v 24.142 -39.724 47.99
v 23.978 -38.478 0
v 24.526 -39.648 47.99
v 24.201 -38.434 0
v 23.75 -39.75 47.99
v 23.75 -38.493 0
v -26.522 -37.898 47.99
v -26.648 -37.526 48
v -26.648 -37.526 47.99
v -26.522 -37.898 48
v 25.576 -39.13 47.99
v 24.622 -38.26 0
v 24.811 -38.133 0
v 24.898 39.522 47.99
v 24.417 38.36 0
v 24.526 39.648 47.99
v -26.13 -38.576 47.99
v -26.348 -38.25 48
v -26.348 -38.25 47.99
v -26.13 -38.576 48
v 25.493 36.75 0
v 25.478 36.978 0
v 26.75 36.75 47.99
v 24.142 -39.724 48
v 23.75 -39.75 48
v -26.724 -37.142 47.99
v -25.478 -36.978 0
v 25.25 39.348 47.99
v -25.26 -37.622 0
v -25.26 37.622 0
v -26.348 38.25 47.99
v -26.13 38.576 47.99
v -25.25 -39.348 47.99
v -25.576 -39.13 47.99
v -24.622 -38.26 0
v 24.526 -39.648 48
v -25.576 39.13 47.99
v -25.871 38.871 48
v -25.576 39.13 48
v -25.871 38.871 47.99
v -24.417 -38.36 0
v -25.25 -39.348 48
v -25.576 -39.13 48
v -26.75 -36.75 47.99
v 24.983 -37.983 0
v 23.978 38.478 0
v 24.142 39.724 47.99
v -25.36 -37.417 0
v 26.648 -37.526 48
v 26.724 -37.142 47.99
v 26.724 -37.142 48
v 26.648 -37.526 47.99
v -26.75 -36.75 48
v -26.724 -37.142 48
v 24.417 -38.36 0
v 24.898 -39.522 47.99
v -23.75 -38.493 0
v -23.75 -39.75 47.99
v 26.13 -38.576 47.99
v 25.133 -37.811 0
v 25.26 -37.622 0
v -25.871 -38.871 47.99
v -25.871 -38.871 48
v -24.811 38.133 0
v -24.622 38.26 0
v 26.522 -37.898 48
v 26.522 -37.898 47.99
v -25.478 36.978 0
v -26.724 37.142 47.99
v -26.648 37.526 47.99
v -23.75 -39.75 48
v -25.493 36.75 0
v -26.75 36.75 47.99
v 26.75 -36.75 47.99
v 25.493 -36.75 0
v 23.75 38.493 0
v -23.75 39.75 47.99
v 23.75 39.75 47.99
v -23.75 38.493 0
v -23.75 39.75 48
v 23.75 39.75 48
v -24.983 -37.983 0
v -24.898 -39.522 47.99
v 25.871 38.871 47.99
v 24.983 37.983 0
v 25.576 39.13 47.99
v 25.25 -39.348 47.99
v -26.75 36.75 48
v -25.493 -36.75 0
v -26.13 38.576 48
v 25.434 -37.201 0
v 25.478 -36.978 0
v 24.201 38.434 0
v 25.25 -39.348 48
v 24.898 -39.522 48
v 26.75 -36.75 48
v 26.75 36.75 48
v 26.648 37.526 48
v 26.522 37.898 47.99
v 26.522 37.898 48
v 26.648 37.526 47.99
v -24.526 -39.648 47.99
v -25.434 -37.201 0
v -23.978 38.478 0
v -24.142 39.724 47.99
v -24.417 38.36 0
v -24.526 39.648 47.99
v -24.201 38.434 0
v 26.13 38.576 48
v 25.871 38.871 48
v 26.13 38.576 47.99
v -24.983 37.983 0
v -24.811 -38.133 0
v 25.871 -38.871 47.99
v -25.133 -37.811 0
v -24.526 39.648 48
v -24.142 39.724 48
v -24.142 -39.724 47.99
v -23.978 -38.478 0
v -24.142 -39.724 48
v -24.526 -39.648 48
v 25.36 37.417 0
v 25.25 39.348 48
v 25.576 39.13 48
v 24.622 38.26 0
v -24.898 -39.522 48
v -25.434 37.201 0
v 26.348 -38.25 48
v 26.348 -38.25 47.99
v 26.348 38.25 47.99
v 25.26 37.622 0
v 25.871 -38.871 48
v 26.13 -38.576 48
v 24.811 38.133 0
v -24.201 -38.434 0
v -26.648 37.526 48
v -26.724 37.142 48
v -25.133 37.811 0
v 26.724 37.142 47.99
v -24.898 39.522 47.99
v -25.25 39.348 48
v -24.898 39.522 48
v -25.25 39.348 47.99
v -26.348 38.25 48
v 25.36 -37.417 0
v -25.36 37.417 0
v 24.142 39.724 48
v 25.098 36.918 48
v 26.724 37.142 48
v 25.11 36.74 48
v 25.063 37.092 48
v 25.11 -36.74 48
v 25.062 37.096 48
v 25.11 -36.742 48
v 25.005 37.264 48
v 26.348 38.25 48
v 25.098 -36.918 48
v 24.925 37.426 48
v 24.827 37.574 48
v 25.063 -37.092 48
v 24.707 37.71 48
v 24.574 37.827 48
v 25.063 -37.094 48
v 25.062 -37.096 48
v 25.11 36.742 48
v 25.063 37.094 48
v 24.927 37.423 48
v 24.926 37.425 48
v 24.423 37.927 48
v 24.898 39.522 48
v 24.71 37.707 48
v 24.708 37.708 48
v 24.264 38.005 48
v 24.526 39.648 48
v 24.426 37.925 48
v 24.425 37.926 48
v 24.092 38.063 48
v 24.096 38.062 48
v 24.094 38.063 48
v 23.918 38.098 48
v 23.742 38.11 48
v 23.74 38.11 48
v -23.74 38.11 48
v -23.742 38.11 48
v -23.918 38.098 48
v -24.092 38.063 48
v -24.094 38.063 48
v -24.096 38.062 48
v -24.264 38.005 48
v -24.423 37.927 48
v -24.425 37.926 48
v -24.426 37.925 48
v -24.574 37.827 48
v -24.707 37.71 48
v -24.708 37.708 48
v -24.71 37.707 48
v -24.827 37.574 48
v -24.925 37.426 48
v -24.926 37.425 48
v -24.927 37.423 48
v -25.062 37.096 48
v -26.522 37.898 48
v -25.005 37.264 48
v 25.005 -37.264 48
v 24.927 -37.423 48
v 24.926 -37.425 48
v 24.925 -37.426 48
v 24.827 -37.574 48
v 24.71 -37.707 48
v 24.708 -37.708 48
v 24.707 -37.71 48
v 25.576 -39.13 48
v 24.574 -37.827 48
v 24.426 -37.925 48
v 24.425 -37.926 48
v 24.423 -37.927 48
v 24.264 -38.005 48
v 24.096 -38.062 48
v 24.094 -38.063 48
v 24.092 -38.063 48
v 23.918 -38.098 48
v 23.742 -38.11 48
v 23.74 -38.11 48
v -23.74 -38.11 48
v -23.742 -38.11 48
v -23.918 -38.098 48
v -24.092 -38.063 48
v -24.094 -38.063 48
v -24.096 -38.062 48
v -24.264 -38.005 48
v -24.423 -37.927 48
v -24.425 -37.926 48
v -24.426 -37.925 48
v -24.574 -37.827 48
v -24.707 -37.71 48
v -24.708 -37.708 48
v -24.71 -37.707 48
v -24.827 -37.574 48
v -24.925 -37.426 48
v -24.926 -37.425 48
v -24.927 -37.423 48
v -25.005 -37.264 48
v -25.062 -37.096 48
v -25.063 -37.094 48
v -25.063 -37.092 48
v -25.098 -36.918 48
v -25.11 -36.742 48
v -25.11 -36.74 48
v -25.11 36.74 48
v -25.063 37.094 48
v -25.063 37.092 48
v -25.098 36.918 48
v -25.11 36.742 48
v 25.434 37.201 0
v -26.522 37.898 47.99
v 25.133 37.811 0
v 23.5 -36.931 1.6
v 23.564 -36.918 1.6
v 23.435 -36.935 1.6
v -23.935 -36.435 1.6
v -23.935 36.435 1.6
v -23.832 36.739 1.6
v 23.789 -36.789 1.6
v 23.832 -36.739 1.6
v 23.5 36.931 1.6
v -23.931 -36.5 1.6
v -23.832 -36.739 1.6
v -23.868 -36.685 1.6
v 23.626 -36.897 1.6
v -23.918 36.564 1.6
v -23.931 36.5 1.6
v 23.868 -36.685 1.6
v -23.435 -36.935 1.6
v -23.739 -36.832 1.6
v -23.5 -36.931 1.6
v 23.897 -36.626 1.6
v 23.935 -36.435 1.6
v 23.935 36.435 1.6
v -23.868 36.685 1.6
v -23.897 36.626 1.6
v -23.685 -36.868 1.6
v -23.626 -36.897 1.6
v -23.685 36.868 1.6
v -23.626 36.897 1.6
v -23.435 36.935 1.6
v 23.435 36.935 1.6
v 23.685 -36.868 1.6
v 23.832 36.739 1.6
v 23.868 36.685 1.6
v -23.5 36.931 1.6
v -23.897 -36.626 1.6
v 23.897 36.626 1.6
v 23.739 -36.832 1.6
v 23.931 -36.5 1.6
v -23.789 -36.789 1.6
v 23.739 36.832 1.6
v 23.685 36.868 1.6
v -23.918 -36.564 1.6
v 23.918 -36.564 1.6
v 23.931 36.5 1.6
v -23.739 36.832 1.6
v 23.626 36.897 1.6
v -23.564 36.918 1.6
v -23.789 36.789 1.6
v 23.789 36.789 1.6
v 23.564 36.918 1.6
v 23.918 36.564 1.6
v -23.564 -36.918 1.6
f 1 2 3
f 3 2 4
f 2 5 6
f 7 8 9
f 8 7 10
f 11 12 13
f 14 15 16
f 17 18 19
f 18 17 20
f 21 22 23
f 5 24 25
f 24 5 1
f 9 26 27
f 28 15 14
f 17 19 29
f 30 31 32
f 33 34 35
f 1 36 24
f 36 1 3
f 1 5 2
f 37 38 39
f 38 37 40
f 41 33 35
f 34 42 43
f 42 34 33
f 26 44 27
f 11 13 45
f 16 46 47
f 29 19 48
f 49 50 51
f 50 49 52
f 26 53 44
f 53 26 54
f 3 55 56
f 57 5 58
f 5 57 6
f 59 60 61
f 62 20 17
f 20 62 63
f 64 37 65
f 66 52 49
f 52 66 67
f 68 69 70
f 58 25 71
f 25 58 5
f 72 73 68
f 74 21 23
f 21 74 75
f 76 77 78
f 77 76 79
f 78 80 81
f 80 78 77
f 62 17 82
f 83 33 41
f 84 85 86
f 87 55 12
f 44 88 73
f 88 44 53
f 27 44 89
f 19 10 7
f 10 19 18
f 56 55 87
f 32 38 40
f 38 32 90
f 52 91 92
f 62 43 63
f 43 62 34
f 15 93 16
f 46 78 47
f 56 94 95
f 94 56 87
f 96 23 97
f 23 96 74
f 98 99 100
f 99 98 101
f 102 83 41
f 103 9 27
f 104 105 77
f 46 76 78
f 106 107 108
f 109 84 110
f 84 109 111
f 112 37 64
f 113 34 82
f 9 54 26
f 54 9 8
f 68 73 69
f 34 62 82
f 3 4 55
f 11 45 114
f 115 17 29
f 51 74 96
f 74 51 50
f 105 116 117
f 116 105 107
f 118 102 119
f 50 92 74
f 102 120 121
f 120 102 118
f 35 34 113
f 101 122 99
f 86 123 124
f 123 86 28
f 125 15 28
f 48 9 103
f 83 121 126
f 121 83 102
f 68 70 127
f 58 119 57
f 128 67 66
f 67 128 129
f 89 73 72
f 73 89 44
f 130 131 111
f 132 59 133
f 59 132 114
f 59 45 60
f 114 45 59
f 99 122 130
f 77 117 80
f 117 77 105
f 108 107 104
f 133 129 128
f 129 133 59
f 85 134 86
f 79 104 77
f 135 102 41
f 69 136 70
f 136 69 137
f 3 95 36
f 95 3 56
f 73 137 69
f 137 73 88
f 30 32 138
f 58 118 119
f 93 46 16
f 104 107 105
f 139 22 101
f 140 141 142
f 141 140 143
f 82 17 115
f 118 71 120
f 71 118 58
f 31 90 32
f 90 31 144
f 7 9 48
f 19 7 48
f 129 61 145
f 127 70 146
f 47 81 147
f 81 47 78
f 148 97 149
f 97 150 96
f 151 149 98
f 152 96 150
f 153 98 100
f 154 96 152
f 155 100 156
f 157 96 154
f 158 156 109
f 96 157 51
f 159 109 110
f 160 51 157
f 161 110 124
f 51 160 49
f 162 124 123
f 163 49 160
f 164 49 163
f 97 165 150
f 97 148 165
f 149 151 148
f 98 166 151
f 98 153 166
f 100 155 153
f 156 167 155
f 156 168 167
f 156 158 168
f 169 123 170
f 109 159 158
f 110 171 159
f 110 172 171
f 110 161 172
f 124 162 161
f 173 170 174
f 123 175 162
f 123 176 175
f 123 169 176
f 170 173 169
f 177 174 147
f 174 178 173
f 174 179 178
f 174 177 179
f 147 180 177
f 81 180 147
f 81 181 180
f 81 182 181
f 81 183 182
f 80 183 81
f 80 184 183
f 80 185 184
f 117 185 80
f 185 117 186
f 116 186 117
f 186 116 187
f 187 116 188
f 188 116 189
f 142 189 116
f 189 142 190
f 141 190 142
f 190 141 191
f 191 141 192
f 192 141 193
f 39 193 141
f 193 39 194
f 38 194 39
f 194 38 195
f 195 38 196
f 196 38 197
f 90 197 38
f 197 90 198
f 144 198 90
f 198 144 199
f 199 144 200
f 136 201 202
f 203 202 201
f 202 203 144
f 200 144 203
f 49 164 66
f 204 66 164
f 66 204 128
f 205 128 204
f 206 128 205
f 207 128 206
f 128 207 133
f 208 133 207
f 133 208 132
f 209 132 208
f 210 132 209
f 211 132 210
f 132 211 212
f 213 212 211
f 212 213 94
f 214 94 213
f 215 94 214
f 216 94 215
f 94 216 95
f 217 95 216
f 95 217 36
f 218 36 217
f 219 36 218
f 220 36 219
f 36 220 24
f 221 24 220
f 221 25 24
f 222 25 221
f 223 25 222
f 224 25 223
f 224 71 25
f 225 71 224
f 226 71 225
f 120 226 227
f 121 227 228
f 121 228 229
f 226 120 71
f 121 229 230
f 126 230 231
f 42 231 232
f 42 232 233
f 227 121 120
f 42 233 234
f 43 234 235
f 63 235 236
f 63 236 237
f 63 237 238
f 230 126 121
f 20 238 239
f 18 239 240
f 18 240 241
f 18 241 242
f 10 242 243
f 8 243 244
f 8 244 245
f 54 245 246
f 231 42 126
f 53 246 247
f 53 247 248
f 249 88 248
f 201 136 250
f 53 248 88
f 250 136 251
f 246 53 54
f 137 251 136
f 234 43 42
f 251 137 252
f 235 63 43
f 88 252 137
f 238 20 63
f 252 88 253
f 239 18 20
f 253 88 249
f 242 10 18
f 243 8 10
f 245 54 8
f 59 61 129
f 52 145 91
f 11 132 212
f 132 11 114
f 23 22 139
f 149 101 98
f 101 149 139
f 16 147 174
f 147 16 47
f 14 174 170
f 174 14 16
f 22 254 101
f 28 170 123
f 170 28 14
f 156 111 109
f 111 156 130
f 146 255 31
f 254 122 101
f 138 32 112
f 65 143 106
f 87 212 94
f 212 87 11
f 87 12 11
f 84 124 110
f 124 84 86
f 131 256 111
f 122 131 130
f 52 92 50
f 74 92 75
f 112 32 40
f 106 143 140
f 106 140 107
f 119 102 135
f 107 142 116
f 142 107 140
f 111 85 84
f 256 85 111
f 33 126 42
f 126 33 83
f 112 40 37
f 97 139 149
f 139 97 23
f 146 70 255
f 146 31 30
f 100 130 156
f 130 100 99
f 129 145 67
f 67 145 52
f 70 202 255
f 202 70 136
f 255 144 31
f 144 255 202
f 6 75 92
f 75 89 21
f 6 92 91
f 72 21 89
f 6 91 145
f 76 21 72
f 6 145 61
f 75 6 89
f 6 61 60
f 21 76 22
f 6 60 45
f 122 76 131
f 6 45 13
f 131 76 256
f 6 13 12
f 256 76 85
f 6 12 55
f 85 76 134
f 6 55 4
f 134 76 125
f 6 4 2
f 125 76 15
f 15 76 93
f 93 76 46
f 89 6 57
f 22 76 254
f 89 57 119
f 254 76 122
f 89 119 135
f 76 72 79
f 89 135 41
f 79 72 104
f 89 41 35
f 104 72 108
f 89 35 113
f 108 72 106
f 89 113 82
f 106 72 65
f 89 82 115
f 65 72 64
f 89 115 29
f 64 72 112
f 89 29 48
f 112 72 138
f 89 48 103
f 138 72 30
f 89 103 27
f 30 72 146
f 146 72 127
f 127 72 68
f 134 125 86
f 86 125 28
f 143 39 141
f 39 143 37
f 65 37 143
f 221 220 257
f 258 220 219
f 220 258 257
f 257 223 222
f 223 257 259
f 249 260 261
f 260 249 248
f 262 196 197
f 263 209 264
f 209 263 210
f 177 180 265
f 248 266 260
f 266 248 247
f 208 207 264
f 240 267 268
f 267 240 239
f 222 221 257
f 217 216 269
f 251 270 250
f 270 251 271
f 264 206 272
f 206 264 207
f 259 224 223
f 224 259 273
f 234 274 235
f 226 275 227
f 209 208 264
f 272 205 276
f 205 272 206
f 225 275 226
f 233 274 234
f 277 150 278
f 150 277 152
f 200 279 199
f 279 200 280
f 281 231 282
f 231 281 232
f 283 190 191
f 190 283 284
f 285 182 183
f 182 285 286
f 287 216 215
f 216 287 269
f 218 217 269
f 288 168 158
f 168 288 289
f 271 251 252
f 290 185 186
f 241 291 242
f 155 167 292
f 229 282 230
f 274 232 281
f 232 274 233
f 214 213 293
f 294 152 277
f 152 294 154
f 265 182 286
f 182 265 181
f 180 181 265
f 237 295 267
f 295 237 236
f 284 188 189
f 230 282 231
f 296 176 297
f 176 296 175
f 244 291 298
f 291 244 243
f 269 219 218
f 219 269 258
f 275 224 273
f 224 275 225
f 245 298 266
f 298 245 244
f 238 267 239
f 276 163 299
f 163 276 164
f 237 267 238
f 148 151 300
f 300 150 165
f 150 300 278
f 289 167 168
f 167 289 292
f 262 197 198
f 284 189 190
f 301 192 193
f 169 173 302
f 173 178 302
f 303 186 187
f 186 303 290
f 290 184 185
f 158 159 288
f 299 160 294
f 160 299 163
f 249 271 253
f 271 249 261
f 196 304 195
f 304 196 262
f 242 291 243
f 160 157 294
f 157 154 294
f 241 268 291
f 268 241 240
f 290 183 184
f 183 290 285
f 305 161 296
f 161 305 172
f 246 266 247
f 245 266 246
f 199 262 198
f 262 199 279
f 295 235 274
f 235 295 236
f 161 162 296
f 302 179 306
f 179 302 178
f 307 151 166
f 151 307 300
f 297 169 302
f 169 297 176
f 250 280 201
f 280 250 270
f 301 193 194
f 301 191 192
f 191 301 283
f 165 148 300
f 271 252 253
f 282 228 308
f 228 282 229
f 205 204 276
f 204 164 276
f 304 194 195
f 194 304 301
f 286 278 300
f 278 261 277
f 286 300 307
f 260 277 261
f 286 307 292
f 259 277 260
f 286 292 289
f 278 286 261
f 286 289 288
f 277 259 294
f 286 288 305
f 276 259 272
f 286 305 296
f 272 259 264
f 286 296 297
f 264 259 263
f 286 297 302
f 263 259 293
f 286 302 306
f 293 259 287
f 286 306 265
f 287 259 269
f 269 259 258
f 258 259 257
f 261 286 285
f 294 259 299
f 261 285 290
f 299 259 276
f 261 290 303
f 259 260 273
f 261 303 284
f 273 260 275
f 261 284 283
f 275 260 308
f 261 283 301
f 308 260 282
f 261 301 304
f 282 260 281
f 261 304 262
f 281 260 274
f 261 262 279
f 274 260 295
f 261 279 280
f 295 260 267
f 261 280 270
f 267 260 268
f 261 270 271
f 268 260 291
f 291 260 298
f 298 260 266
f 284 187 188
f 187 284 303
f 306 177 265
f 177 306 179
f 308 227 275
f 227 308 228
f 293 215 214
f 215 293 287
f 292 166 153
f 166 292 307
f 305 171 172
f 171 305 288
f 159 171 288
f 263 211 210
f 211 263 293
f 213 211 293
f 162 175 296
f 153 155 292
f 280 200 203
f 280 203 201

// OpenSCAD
// =====================================================================
// STOREHOUSE Bin Generator  (Harbor Freight Medium 20-bin + Large 8-bin)
// v0.5  —  grid from caliper measurements. Pairs with the Storehouse Bin Builder web app
// =====================================================================
//
// THE GRID LANGUAGE
//   Every bin is   <case>-<W>x<N>     e.g.  M-1x1   M-2x2   L-2x4
//
//   W = wide cells   (54 mm each)
//   N = narrow cells (40 mm each)
//   case = M (Medium case, 50 mm tall)  or  L (Large case, 94 mm tall)
//
//   Both cases share one floor:  10 x 4 main block  +  2-deep handle strip.
//   In the handle strip, bins sit rotated 90 degrees. Same code, turned.
//
//   Stock bins:
//     Medium case:  small M-1x1   medium M-1x2   big M-2x2
//     Large case:   small L-2x2   large  L-2x4
//
//   Size formula:  top outer = cells * pitch - 2 * clearance
//
// STACKING
//   A stacked slot is a shorter bottom bin plus top tray(s) that fill the
//   rest of the case height. Each tray has a plug that drops inside the
//   bin's rim. Set stack = true, then render part = "base" and part = "tray"
//   and export each. part = "assembled" shows them together (not for printing).
// ---------------------------------------------------------------------

/* [Bin] */
case_type   = "M";   // [M:Medium case (50 mm), L:Large case (94 mm)]
cells_w     = 1;     // [1:1:4]   wide cells, 54 mm each
cells_n     = 2;     // [1:1:10]  narrow cells, 40 mm each
half_height = false; // half-height bin. Ignored when stacked
custom_height = 0;   // mm. 0 = use case height. Overrides half_height. Ignored when stacked

/* [Dividers] */
div_w = 1;  // compartments across the W direction (bottom bin when stacked)
div_n = 1;  // compartments across the N direction (bottom bin when stacked)
divider_height_pct = 100; // [20:5:100]

/* [Feet] */
feet = "none";    // [none:None (prints flat, no supports), corners:Corners (like stock), perimeter:Every cell corner on the edge]

/* [Label] */
label       = "";     // one label, on every compartment touching the label wall. Or fill `labels` below, one per compartment
labels      = [];     // e.g. [["M3", "M4"], ["", ""]]: row 0 touches the label wall, later rows go inward; columns run along the wall. Copy OpenSCAD settings in the app fills this in
label_plate = false;  // the shelf with no letters, for a sticker or a marker
label_wall  = "W+";   // [W+:+W wall, W-:-W wall, N+:+N wall, N-:-N wall]  (Copy OpenSCAD settings in the app picks the wall farthest from you)
label_depth = 6;      // mm the shelf reaches into the bin
label_face  = 10;     // mm, height of the sloped face the letters sit on
label_raise = 0.5;    // mm the letters stand off the face
label_font  = "Liberation Sans:style=Bold";

/* [Stacking] */
stack        = false;
part         = "base";  // [base:Bottom bin, tray:Top tray, assembled:Assembled preview]
lower_height = 0;       // mm, bottom bin height. 0 = half the case height
split        = "1";     // [1:One tray, w:Two across W, n:Two across N, 4:Four trays]
tray_div_w   = 1;       // compartments inside each tray, across W
tray_div_n   = 1;       // compartments inside each tray, across N

/* [Grid calibration] */
pitch_w   = 54;    // mm per W cell (stock large bin: 108 = 2 cells)
pitch_n   = 40;    // mm per N cell (stock large bin: 160 = 4 cells)
height_M  = 48;    // mm, Medium case bins
height_L  = 92;    // mm, Large case bins
clearance = 0.25;  // mm off each side so printed bins drop in (stock fit is snug)

/* [Construction] */
wall       = 1.6;
floor_t    = 1.6;
corner_r   = 3.0;
draft_deg  = 1.5;  // per side. Stock large bin: 108 top, 103 bottom over 94 tall
divider_t  = 1.2;
foot_d     = 5;    // stock: 5 mm
foot_h     = 1.6;  // stock: 1.6 mm. Case pockets are 20 mm wide, so placement is forgiving
foot_inset = 4;    // foot center to bin edge
plug_depth = 4;    // how far a tray drops inside the bin below
plug_clearance = 0.4; // per side, between tray plug and bin rim
tray_gap   = 0.6;  // between split trays
$fn = 48;

// ------------------------------------------------ derived
function outer(cells, pitch) = cells * pitch - 2 * clearance;

bin_x  = outer(cells_w, pitch_w);
bin_y  = outer(cells_n, pitch_n);
full_h = (case_type == "L") ? height_L : height_M;
low_h  = max(15, min(full_h - 15, lower_height > 0 ? lower_height : full_h / 2));
bin_h  = stack ? low_h
       : custom_height > 0 ? min(custom_height, full_h)
       : half_height ? full_h / 2 : full_h;
body_h = bin_h;  // feet add foot_h below the body, they do not eat into it
feet_h = feet == "none" ? 0 : foot_h;
inset  = body_h * tan(draft_deg);  // body bottom is this much smaller per side

tray_h = full_h - low_h + plug_depth;  // overall tray height, plug included
kx     = (split == "w" || split == "4") ? 2 : 1;
ky     = (split == "n" || split == "4") ? 2 : 1;
tray_x = (bin_x - (kx - 1) * tray_gap) / kx;
tray_y = (bin_y - (ky - 1) * tray_gap) / ky;

echo(str("BIN ", case_type, "-", cells_w, "x", cells_n,
         stack ? str(" stacked ", low_h, " + ", tray_h - plug_depth) : half_height ? " half" : "",
         "   top ", bin_x, " x ", bin_y,
         "   bottom ", bin_x - 2*inset, " x ", bin_y - 2*inset,
         "   height ", bin_h, " mm"));
if (stack) echo(str("TRAY x", kx * ky, "   ", tray_x, " x ", tray_y,
                    "   overall height ", tray_h, " mm (", plug_depth, " mm plug)"));

// ------------------------------------------------ helpers
module rrect(x, y, r) {
    r2 = max(0.3, min(r, x/2 - 0.01, y/2 - 0.01));
    offset(r2) square([x - 2*r2, y - 2*r2], center = true);
}

// thin slab of a rounded rectangle at height z, used to build lofts with hull()
module slab(x, y, r, z) {
    translate([0, 0, z]) linear_extrude(0.01) rrect(x, y, r);
}

// tapered rounded box, smaller at z=0, full size at z=h
module tapered(x, y, h, r, ins) {
    hull() {
        slab(x - 2*ins, y - 2*ins, max(r - ins, 0.5), 0);
        slab(x, y, r, h - 0.01);
    }
}

// ------------------------------------------------ label shelf
// A triangular prism fused to the inside of one wall just below z_top. Its face slopes up toward the viewer and
// carries the letters; its underside runs back to the wall at 45 degrees, so it prints without supports.
lab_p  = (label_wall == "W+" || label_wall == "W-") ? 0 : 1;   // 0: wall perpendicular to W (x), 1: perpendicular to N (y)
lab_s  = (label_wall == "W+" || label_wall == "N+") ? 1 : -1;
lab_ov = wall * 0.7;
lab_ep = lab_p == 0 ? [1, 0, 0] : [0, 1, 0];
lab_es = lab_p == 0 ? [0, 1, 0] : [1, 0, 0];
function bin_inner(z, axis)  = (axis == 0 ? bin_x : bin_y) - 2 * wall - 2 * inset * (1 - z / body_h);
function tray_inner(z, axis) = let(a = (axis == 0 ? tr_px - 2 * tr_dr : tr_py - 2 * tr_dr) - 2 * wall, b = (axis == 0 ? tray_x : tray_y) - 2 * wall)
                               a + (b - a) * (z - floor_t) / (tray_h + 1 - floor_t);
function lab_inner(z, axis, tray) = tray ? tray_inner(z, axis) : bin_inner(z, axis);
function lab_scale(z_top) = min(1, (z_top - floor_t - 0.5) / (label_face + label_depth));  // shrink the shelf on short parts

lab_corner = max(corner_r - wall, 0.5) + 0.5;
div_h0     = (body_h - floor_t) * divider_height_pct / 100;
lab_div_top = floor_t + (stack ? min(div_h0, body_h - floor_t - plug_depth - 1) : div_h0);   // top of the bin's dividers
function lab_text(i, j) = len(labels) > i && len(labels[i]) > j ? labels[i][j] : (len(labels) == 0 && i == 0 ? label : "");
function lab_wp(z, tray) = lab_inner(z, lab_p, tray);        // inner width across the label axis
function lab_ws(z, tray) = lab_inner(z, 1 - lab_p, tray);    // inner width along the wall
function lab_div(z, m, np, tray) = lab_s * (-lab_wp(z, tray) / 2 + m * lab_wp(z, tray) / np);   // divider m, as a distance toward the wall
function lab_u_back(z, at_wall, m, np, tray) = at_wall ? lab_wp(z, tray) / 2 + lab_ov : lab_div(z, m, np, tray) + divider_t / 2 - 0.2;
function lab_u_face(z, at_wall, m, np, tray) = at_wall ? lab_wp(z, tray) / 2 : lab_div(z, m, np, tray) - divider_t / 2;
function lab_s_lo(z, j, ns, tray) = -lab_ws(z, tray) / 2 + j * lab_ws(z, tray) / ns + (j == 0 ? lab_corner : divider_t / 2 + 0.5);
function lab_s_hi(z, j, ns, tray) = -lab_ws(z, tray) / 2 + (j + 1) * lab_ws(z, tray) / ns - (j == ns - 1 ? lab_corner : divider_t / 2 + 0.5);

// One shelf per compartment with text (or a blank plate). Row 0 sits on the label wall; deeper rows hang on the near
// face of the divider in front of them. nW x nN are the part's compartments, z_div_top the top of its dividers.
module label_shelves(z_top, z_div_top, nW, nN, tray = false) {
    np = lab_p == 0 ? nW : nN;  ns = lab_p == 0 ? nN : nW;
    for (i = [0 : np - 1], j = [0 : ns - 1]) if (lab_text(i, j) != "" || label_plate) {
        at_wall = i == 0;
        zt = at_wall ? z_top : min(z_top, z_div_top);
        sc = lab_scale(zt);
        ip = lab_s > 0 ? np - 1 - i : i;   // compartment index along +axis
        m  = lab_s > 0 ? ip + 1 : ip;      // the divider on its wall side
        txt = lab_text(i, j);
        if (sc >= 0.5) {
            fh = label_face * sc;  xd = label_depth * sc;  z_mid = zt - fh;  z_under = z_mid - xd;
            u_top = lab_u_back(zt, at_wall, m, np, tray);  u_face = lab_u_face(zt, at_wall, m, np, tray);
            u_in = lab_u_face(z_mid, at_wall, m, np, tray) - xd;  u_under = lab_u_back(z_under, at_wall, m, np, tray);
            s_lo = max(lab_s_lo(z_under, j, ns, tray), lab_s_lo(zt, j, ns, tray));
            s_hi = min(lab_s_hi(z_under, j, ns, tray), lab_s_hi(zt, j, ns, tray));
            L = s_hi - s_lo;  s_mid = (s_lo + s_hi) / 2;
            depth = lab_wp(z_mid, tray) / np - (at_wall ? divider_t / 2 : divider_t);
            face_len = norm([u_face - u_in, fh]);
            cap = txt == "" ? 0 : min(6, face_len - 3, (L - 3) / (0.8 * len(txt)));
            if (L >= 8 && depth >= xd + 4) {
                // the prism: a triangle in the (u, z) plane, extruded along the wall, moved to this compartment
                translate(lab_es * s_mid)
                    multmatrix([[lab_ep[0] * lab_s, 0, lab_es[0], 0], [lab_ep[1] * lab_s, 0, lab_es[1], 0], [0, 1, 0, 0], [0, 0, 0, 1]])
                        linear_extrude(L, center = true) polygon([[u_top, zt], [u_in, z_mid], [u_under, z_under]]);
                // the letters: text drawn in a frame on the face (h = reading direction, q = up the slope, n = out of the face)
                if (txt != "" && cap >= 3.5) {
                    c = lab_ep * lab_s * (u_face + u_in) / 2 + lab_es * s_mid + [0, 0, (zt + z_mid) / 2];
                    q = (lab_ep * lab_s * (u_face - u_in) + [0, 0, fh]) / face_len;
                    h = cross(lab_ep * lab_s, [0, 0, 1]);
                    n = cross(h, q);
                    multmatrix([[h[0], q[0], n[0], c[0]], [h[1], q[1], n[1], c[1]], [h[2], q[2], n[2], c[2]], [0, 0, 0, 1]])
                        translate([0, 0, -0.3]) linear_extrude(label_raise + 0.3)
                            text(txt, size = cap, font = label_font, halign = "center", valign = "center");
                } else if (txt != "") echo(str("Label '", txt, "' skipped: no room for readable letters in that compartment"));
            } else echo(str("Label shelf skipped in compartment ", i, ",", j, ": compartment too small"));
        } else echo("Label shelf skipped: part too short");
    }
}
// What a rib must stay out of: everything inboard of each wall shelf's face, from its underside up, across that
// compartment. Dividers need no cut, since wall shelves sit between them.
module label_keepout(z_top, nW, nN, tray = false) {
    np = lab_p == 0 ? nW : nN;  ns = lab_p == 0 ? nN : nW;
    sc = lab_scale(z_top);
    if (sc >= 0.5) for (j = [0 : ns - 1]) if (lab_text(0, j) != "" || label_plate) {
        fh = label_face * sc;  xd = label_depth * sc;  z_mid = z_top - fh;  z_under = z_mid - xd;
        u_in = lab_wp(z_mid, tray) / 2 - xd;
        s_lo = lab_s_lo(z_under, j, ns, tray);  s_hi = lab_s_hi(z_under, j, ns, tray);
        big = max(bin_x, bin_y) + 20;
        translate(lab_ep * lab_s * (u_in - 0.5 + big / 2) + lab_es * (s_lo + s_hi) / 2 + [0, 0, z_under + 0.5 + big / 2])
            cube([lab_p == 0 ? big : s_hi - s_lo, lab_p == 0 ? s_hi - s_lo : big, big], center = true);
    }
}
lab_top = stack ? body_h - plug_depth - 1 : body_h;   // on a stacked bin the shelf sits under the tray plug

// ------------------------------------------------ bottom bin / single bin (built on z = 0, raised later)
module shell() {
    difference() {
        tapered(bin_x, bin_y, body_h, corner_r, inset);
        translate([0, 0, floor_t])
            tapered(bin_x - 2*wall, bin_y - 2*wall, body_h,
                    max(corner_r - wall, 0.5), inset * (1 - floor_t / body_h));
    }
}

module dividers() {
    ix = bin_x - 2*wall;
    iy = bin_y - 2*wall;
    dh0 = (body_h - floor_t) * divider_height_pct / 100;
    dh = stack ? min(dh0, body_h - floor_t - plug_depth - 1) : dh0;  // leave room for the tray plug
    if (div_w > 1) for (i = [1 : div_w - 1])
        translate([-ix/2 + i * ix / div_w - divider_t/2, -iy/2, floor_t])
            cube([divider_t, iy, dh]);
    if (div_n > 1) for (j = [1 : div_n - 1])
        translate([-ix/2, -iy/2 + j * iy / div_n - divider_t/2, floor_t])
            cube([ix, divider_t, dh]);
}

// support ribs under the lines where split trays meet, up to rim height
module ribs() {
    rib_t = 2 * wall + tray_gap;  // fits between neighboring tray plugs
    if (stack && kx == 2)
        translate([-rib_t/2, -bin_y/2, floor_t - 0.01]) cube([rib_t, bin_y, body_h - floor_t + 0.01]);
    if (stack && ky == 2)
        translate([-bin_x/2, -rib_t/2, floor_t - 0.01]) cube([bin_x, rib_t, body_h - floor_t + 0.01]);
}

module foot_at(x, y) {
    translate([x, y, 0]) cylinder(d = foot_d, h = foot_h + 0.01);
}

module all_feet() {
    bx = bin_x / 2 - inset - foot_inset;
    by = bin_y / 2 - inset - foot_inset;
    if (feet == "corners") {
        for (sx = [-1, 1], sy = [-1, 1]) foot_at(sx * bx, sy * by);
    } else if (feet == "perimeter") {
        // corners of every cell that sit on the outer edge
        xs = [for (i = [0 : cells_w]) (i == 0) ? -bx : (i == cells_w) ? bx
                                       : -bin_x/2 + clearance + i * pitch_w];
        ys = [for (j = [0 : cells_n]) (j == 0) ? -by : (j == cells_n) ? by
                                       : -bin_y/2 + clearance + j * pitch_n];
        for (x = xs, y = [-by, by]) foot_at(x, y);
        for (y = ys, x = [-bx, bx]) foot_at(x, y);
    }
}

module body() {
    intersection() {
        tapered(bin_x, bin_y, body_h, corner_r, inset);
        union() {
            shell();
            dividers();
            difference() { ribs(); label_keepout(lab_top, div_w, div_n); }
            label_shelves(lab_top, lab_div_top, div_w, div_n);
        }
    }
}

module bin() {
    if (feet == "none") {
        body();
    } else {
        all_feet();
        translate([0, 0, foot_h]) body();
    }
}

// ------------------------------------------------ top tray (one; split trays are all the same)
// Prints right side up: plug -> 45 degree chamfer -> straight body. No supports.
tr_e  = wall + plug_clearance;              // plug is inset this much on every side
tr_dr = plug_depth * tan(draft_deg);        // plug tapers like the bin wall it sits in
tr_px = tray_x - 2 * tr_e;
tr_py = tray_y - 2 * tr_e;

module tray_outer() {
    hull() {  // plug
        slab(tr_px - 2*tr_dr, tr_py - 2*tr_dr, corner_r - tr_e, 0);
        slab(tr_px, tr_py, corner_r - tr_e, plug_depth - 0.01);
    }
    hull() {  // chamfer
        slab(tr_px, tr_py, corner_r - tr_e, plug_depth - 0.01);
        slab(tray_x, tray_y, corner_r, plug_depth + tr_e - 0.01);
    }
    translate([0, 0, plug_depth + tr_e - 0.02])  // body
        linear_extrude(tray_h - plug_depth - tr_e + 0.02) rrect(tray_x, tray_y, corner_r);
}

module tray_cavity() {
    hull() {  // straight from the floor ring up past the rim
        slab(tr_px - 2*tr_dr - 2*wall, tr_py - 2*tr_dr - 2*wall, corner_r - tr_e - wall, floor_t);
        slab(tray_x - 2*wall, tray_y - 2*wall, corner_r - wall, tray_h + 1);
    }
}

module tray_dividers() {
    ix = tray_x - 2*wall;
    iy = tray_y - 2*wall;
    h  = tray_h - floor_t;
    if (tray_div_w > 1) for (i = [1 : tray_div_w - 1])
        translate([-ix/2 + i * ix / tray_div_w - divider_t/2, -iy/2, floor_t - 0.01]) cube([divider_t, iy, h]);
    if (tray_div_n > 1) for (j = [1 : tray_div_n - 1])
        translate([-ix/2, -iy/2 + j * iy / tray_div_n - divider_t/2, floor_t - 0.01]) cube([ix, divider_t, h]);
}

module tray() {
    difference() { tray_outer(); tray_cavity(); }
    intersection() {
        tray_outer();
        union() {
            tray_dividers();
            label_shelves(tray_h, tray_h, tray_div_w, tray_div_n, true);
        }
    }
}

// ------------------------------------------------ output
if (!stack) {
    bin();
} else if (part == "base") {
    bin();
} else if (part == "tray") {
    tray();
} else {  // assembled preview: trays seated on the bottom bin
    color("gold") bin();
    for (i = [0 : kx - 1], j = [0 : ky - 1])
        color("orange")
            translate([-bin_x/2 + tray_x/2 + i * (tray_x + tray_gap),
                       -bin_y/2 + tray_y/2 + j * (tray_y + tray_gap),
                       feet_h + bin_h - plug_depth])
                tray();
}
